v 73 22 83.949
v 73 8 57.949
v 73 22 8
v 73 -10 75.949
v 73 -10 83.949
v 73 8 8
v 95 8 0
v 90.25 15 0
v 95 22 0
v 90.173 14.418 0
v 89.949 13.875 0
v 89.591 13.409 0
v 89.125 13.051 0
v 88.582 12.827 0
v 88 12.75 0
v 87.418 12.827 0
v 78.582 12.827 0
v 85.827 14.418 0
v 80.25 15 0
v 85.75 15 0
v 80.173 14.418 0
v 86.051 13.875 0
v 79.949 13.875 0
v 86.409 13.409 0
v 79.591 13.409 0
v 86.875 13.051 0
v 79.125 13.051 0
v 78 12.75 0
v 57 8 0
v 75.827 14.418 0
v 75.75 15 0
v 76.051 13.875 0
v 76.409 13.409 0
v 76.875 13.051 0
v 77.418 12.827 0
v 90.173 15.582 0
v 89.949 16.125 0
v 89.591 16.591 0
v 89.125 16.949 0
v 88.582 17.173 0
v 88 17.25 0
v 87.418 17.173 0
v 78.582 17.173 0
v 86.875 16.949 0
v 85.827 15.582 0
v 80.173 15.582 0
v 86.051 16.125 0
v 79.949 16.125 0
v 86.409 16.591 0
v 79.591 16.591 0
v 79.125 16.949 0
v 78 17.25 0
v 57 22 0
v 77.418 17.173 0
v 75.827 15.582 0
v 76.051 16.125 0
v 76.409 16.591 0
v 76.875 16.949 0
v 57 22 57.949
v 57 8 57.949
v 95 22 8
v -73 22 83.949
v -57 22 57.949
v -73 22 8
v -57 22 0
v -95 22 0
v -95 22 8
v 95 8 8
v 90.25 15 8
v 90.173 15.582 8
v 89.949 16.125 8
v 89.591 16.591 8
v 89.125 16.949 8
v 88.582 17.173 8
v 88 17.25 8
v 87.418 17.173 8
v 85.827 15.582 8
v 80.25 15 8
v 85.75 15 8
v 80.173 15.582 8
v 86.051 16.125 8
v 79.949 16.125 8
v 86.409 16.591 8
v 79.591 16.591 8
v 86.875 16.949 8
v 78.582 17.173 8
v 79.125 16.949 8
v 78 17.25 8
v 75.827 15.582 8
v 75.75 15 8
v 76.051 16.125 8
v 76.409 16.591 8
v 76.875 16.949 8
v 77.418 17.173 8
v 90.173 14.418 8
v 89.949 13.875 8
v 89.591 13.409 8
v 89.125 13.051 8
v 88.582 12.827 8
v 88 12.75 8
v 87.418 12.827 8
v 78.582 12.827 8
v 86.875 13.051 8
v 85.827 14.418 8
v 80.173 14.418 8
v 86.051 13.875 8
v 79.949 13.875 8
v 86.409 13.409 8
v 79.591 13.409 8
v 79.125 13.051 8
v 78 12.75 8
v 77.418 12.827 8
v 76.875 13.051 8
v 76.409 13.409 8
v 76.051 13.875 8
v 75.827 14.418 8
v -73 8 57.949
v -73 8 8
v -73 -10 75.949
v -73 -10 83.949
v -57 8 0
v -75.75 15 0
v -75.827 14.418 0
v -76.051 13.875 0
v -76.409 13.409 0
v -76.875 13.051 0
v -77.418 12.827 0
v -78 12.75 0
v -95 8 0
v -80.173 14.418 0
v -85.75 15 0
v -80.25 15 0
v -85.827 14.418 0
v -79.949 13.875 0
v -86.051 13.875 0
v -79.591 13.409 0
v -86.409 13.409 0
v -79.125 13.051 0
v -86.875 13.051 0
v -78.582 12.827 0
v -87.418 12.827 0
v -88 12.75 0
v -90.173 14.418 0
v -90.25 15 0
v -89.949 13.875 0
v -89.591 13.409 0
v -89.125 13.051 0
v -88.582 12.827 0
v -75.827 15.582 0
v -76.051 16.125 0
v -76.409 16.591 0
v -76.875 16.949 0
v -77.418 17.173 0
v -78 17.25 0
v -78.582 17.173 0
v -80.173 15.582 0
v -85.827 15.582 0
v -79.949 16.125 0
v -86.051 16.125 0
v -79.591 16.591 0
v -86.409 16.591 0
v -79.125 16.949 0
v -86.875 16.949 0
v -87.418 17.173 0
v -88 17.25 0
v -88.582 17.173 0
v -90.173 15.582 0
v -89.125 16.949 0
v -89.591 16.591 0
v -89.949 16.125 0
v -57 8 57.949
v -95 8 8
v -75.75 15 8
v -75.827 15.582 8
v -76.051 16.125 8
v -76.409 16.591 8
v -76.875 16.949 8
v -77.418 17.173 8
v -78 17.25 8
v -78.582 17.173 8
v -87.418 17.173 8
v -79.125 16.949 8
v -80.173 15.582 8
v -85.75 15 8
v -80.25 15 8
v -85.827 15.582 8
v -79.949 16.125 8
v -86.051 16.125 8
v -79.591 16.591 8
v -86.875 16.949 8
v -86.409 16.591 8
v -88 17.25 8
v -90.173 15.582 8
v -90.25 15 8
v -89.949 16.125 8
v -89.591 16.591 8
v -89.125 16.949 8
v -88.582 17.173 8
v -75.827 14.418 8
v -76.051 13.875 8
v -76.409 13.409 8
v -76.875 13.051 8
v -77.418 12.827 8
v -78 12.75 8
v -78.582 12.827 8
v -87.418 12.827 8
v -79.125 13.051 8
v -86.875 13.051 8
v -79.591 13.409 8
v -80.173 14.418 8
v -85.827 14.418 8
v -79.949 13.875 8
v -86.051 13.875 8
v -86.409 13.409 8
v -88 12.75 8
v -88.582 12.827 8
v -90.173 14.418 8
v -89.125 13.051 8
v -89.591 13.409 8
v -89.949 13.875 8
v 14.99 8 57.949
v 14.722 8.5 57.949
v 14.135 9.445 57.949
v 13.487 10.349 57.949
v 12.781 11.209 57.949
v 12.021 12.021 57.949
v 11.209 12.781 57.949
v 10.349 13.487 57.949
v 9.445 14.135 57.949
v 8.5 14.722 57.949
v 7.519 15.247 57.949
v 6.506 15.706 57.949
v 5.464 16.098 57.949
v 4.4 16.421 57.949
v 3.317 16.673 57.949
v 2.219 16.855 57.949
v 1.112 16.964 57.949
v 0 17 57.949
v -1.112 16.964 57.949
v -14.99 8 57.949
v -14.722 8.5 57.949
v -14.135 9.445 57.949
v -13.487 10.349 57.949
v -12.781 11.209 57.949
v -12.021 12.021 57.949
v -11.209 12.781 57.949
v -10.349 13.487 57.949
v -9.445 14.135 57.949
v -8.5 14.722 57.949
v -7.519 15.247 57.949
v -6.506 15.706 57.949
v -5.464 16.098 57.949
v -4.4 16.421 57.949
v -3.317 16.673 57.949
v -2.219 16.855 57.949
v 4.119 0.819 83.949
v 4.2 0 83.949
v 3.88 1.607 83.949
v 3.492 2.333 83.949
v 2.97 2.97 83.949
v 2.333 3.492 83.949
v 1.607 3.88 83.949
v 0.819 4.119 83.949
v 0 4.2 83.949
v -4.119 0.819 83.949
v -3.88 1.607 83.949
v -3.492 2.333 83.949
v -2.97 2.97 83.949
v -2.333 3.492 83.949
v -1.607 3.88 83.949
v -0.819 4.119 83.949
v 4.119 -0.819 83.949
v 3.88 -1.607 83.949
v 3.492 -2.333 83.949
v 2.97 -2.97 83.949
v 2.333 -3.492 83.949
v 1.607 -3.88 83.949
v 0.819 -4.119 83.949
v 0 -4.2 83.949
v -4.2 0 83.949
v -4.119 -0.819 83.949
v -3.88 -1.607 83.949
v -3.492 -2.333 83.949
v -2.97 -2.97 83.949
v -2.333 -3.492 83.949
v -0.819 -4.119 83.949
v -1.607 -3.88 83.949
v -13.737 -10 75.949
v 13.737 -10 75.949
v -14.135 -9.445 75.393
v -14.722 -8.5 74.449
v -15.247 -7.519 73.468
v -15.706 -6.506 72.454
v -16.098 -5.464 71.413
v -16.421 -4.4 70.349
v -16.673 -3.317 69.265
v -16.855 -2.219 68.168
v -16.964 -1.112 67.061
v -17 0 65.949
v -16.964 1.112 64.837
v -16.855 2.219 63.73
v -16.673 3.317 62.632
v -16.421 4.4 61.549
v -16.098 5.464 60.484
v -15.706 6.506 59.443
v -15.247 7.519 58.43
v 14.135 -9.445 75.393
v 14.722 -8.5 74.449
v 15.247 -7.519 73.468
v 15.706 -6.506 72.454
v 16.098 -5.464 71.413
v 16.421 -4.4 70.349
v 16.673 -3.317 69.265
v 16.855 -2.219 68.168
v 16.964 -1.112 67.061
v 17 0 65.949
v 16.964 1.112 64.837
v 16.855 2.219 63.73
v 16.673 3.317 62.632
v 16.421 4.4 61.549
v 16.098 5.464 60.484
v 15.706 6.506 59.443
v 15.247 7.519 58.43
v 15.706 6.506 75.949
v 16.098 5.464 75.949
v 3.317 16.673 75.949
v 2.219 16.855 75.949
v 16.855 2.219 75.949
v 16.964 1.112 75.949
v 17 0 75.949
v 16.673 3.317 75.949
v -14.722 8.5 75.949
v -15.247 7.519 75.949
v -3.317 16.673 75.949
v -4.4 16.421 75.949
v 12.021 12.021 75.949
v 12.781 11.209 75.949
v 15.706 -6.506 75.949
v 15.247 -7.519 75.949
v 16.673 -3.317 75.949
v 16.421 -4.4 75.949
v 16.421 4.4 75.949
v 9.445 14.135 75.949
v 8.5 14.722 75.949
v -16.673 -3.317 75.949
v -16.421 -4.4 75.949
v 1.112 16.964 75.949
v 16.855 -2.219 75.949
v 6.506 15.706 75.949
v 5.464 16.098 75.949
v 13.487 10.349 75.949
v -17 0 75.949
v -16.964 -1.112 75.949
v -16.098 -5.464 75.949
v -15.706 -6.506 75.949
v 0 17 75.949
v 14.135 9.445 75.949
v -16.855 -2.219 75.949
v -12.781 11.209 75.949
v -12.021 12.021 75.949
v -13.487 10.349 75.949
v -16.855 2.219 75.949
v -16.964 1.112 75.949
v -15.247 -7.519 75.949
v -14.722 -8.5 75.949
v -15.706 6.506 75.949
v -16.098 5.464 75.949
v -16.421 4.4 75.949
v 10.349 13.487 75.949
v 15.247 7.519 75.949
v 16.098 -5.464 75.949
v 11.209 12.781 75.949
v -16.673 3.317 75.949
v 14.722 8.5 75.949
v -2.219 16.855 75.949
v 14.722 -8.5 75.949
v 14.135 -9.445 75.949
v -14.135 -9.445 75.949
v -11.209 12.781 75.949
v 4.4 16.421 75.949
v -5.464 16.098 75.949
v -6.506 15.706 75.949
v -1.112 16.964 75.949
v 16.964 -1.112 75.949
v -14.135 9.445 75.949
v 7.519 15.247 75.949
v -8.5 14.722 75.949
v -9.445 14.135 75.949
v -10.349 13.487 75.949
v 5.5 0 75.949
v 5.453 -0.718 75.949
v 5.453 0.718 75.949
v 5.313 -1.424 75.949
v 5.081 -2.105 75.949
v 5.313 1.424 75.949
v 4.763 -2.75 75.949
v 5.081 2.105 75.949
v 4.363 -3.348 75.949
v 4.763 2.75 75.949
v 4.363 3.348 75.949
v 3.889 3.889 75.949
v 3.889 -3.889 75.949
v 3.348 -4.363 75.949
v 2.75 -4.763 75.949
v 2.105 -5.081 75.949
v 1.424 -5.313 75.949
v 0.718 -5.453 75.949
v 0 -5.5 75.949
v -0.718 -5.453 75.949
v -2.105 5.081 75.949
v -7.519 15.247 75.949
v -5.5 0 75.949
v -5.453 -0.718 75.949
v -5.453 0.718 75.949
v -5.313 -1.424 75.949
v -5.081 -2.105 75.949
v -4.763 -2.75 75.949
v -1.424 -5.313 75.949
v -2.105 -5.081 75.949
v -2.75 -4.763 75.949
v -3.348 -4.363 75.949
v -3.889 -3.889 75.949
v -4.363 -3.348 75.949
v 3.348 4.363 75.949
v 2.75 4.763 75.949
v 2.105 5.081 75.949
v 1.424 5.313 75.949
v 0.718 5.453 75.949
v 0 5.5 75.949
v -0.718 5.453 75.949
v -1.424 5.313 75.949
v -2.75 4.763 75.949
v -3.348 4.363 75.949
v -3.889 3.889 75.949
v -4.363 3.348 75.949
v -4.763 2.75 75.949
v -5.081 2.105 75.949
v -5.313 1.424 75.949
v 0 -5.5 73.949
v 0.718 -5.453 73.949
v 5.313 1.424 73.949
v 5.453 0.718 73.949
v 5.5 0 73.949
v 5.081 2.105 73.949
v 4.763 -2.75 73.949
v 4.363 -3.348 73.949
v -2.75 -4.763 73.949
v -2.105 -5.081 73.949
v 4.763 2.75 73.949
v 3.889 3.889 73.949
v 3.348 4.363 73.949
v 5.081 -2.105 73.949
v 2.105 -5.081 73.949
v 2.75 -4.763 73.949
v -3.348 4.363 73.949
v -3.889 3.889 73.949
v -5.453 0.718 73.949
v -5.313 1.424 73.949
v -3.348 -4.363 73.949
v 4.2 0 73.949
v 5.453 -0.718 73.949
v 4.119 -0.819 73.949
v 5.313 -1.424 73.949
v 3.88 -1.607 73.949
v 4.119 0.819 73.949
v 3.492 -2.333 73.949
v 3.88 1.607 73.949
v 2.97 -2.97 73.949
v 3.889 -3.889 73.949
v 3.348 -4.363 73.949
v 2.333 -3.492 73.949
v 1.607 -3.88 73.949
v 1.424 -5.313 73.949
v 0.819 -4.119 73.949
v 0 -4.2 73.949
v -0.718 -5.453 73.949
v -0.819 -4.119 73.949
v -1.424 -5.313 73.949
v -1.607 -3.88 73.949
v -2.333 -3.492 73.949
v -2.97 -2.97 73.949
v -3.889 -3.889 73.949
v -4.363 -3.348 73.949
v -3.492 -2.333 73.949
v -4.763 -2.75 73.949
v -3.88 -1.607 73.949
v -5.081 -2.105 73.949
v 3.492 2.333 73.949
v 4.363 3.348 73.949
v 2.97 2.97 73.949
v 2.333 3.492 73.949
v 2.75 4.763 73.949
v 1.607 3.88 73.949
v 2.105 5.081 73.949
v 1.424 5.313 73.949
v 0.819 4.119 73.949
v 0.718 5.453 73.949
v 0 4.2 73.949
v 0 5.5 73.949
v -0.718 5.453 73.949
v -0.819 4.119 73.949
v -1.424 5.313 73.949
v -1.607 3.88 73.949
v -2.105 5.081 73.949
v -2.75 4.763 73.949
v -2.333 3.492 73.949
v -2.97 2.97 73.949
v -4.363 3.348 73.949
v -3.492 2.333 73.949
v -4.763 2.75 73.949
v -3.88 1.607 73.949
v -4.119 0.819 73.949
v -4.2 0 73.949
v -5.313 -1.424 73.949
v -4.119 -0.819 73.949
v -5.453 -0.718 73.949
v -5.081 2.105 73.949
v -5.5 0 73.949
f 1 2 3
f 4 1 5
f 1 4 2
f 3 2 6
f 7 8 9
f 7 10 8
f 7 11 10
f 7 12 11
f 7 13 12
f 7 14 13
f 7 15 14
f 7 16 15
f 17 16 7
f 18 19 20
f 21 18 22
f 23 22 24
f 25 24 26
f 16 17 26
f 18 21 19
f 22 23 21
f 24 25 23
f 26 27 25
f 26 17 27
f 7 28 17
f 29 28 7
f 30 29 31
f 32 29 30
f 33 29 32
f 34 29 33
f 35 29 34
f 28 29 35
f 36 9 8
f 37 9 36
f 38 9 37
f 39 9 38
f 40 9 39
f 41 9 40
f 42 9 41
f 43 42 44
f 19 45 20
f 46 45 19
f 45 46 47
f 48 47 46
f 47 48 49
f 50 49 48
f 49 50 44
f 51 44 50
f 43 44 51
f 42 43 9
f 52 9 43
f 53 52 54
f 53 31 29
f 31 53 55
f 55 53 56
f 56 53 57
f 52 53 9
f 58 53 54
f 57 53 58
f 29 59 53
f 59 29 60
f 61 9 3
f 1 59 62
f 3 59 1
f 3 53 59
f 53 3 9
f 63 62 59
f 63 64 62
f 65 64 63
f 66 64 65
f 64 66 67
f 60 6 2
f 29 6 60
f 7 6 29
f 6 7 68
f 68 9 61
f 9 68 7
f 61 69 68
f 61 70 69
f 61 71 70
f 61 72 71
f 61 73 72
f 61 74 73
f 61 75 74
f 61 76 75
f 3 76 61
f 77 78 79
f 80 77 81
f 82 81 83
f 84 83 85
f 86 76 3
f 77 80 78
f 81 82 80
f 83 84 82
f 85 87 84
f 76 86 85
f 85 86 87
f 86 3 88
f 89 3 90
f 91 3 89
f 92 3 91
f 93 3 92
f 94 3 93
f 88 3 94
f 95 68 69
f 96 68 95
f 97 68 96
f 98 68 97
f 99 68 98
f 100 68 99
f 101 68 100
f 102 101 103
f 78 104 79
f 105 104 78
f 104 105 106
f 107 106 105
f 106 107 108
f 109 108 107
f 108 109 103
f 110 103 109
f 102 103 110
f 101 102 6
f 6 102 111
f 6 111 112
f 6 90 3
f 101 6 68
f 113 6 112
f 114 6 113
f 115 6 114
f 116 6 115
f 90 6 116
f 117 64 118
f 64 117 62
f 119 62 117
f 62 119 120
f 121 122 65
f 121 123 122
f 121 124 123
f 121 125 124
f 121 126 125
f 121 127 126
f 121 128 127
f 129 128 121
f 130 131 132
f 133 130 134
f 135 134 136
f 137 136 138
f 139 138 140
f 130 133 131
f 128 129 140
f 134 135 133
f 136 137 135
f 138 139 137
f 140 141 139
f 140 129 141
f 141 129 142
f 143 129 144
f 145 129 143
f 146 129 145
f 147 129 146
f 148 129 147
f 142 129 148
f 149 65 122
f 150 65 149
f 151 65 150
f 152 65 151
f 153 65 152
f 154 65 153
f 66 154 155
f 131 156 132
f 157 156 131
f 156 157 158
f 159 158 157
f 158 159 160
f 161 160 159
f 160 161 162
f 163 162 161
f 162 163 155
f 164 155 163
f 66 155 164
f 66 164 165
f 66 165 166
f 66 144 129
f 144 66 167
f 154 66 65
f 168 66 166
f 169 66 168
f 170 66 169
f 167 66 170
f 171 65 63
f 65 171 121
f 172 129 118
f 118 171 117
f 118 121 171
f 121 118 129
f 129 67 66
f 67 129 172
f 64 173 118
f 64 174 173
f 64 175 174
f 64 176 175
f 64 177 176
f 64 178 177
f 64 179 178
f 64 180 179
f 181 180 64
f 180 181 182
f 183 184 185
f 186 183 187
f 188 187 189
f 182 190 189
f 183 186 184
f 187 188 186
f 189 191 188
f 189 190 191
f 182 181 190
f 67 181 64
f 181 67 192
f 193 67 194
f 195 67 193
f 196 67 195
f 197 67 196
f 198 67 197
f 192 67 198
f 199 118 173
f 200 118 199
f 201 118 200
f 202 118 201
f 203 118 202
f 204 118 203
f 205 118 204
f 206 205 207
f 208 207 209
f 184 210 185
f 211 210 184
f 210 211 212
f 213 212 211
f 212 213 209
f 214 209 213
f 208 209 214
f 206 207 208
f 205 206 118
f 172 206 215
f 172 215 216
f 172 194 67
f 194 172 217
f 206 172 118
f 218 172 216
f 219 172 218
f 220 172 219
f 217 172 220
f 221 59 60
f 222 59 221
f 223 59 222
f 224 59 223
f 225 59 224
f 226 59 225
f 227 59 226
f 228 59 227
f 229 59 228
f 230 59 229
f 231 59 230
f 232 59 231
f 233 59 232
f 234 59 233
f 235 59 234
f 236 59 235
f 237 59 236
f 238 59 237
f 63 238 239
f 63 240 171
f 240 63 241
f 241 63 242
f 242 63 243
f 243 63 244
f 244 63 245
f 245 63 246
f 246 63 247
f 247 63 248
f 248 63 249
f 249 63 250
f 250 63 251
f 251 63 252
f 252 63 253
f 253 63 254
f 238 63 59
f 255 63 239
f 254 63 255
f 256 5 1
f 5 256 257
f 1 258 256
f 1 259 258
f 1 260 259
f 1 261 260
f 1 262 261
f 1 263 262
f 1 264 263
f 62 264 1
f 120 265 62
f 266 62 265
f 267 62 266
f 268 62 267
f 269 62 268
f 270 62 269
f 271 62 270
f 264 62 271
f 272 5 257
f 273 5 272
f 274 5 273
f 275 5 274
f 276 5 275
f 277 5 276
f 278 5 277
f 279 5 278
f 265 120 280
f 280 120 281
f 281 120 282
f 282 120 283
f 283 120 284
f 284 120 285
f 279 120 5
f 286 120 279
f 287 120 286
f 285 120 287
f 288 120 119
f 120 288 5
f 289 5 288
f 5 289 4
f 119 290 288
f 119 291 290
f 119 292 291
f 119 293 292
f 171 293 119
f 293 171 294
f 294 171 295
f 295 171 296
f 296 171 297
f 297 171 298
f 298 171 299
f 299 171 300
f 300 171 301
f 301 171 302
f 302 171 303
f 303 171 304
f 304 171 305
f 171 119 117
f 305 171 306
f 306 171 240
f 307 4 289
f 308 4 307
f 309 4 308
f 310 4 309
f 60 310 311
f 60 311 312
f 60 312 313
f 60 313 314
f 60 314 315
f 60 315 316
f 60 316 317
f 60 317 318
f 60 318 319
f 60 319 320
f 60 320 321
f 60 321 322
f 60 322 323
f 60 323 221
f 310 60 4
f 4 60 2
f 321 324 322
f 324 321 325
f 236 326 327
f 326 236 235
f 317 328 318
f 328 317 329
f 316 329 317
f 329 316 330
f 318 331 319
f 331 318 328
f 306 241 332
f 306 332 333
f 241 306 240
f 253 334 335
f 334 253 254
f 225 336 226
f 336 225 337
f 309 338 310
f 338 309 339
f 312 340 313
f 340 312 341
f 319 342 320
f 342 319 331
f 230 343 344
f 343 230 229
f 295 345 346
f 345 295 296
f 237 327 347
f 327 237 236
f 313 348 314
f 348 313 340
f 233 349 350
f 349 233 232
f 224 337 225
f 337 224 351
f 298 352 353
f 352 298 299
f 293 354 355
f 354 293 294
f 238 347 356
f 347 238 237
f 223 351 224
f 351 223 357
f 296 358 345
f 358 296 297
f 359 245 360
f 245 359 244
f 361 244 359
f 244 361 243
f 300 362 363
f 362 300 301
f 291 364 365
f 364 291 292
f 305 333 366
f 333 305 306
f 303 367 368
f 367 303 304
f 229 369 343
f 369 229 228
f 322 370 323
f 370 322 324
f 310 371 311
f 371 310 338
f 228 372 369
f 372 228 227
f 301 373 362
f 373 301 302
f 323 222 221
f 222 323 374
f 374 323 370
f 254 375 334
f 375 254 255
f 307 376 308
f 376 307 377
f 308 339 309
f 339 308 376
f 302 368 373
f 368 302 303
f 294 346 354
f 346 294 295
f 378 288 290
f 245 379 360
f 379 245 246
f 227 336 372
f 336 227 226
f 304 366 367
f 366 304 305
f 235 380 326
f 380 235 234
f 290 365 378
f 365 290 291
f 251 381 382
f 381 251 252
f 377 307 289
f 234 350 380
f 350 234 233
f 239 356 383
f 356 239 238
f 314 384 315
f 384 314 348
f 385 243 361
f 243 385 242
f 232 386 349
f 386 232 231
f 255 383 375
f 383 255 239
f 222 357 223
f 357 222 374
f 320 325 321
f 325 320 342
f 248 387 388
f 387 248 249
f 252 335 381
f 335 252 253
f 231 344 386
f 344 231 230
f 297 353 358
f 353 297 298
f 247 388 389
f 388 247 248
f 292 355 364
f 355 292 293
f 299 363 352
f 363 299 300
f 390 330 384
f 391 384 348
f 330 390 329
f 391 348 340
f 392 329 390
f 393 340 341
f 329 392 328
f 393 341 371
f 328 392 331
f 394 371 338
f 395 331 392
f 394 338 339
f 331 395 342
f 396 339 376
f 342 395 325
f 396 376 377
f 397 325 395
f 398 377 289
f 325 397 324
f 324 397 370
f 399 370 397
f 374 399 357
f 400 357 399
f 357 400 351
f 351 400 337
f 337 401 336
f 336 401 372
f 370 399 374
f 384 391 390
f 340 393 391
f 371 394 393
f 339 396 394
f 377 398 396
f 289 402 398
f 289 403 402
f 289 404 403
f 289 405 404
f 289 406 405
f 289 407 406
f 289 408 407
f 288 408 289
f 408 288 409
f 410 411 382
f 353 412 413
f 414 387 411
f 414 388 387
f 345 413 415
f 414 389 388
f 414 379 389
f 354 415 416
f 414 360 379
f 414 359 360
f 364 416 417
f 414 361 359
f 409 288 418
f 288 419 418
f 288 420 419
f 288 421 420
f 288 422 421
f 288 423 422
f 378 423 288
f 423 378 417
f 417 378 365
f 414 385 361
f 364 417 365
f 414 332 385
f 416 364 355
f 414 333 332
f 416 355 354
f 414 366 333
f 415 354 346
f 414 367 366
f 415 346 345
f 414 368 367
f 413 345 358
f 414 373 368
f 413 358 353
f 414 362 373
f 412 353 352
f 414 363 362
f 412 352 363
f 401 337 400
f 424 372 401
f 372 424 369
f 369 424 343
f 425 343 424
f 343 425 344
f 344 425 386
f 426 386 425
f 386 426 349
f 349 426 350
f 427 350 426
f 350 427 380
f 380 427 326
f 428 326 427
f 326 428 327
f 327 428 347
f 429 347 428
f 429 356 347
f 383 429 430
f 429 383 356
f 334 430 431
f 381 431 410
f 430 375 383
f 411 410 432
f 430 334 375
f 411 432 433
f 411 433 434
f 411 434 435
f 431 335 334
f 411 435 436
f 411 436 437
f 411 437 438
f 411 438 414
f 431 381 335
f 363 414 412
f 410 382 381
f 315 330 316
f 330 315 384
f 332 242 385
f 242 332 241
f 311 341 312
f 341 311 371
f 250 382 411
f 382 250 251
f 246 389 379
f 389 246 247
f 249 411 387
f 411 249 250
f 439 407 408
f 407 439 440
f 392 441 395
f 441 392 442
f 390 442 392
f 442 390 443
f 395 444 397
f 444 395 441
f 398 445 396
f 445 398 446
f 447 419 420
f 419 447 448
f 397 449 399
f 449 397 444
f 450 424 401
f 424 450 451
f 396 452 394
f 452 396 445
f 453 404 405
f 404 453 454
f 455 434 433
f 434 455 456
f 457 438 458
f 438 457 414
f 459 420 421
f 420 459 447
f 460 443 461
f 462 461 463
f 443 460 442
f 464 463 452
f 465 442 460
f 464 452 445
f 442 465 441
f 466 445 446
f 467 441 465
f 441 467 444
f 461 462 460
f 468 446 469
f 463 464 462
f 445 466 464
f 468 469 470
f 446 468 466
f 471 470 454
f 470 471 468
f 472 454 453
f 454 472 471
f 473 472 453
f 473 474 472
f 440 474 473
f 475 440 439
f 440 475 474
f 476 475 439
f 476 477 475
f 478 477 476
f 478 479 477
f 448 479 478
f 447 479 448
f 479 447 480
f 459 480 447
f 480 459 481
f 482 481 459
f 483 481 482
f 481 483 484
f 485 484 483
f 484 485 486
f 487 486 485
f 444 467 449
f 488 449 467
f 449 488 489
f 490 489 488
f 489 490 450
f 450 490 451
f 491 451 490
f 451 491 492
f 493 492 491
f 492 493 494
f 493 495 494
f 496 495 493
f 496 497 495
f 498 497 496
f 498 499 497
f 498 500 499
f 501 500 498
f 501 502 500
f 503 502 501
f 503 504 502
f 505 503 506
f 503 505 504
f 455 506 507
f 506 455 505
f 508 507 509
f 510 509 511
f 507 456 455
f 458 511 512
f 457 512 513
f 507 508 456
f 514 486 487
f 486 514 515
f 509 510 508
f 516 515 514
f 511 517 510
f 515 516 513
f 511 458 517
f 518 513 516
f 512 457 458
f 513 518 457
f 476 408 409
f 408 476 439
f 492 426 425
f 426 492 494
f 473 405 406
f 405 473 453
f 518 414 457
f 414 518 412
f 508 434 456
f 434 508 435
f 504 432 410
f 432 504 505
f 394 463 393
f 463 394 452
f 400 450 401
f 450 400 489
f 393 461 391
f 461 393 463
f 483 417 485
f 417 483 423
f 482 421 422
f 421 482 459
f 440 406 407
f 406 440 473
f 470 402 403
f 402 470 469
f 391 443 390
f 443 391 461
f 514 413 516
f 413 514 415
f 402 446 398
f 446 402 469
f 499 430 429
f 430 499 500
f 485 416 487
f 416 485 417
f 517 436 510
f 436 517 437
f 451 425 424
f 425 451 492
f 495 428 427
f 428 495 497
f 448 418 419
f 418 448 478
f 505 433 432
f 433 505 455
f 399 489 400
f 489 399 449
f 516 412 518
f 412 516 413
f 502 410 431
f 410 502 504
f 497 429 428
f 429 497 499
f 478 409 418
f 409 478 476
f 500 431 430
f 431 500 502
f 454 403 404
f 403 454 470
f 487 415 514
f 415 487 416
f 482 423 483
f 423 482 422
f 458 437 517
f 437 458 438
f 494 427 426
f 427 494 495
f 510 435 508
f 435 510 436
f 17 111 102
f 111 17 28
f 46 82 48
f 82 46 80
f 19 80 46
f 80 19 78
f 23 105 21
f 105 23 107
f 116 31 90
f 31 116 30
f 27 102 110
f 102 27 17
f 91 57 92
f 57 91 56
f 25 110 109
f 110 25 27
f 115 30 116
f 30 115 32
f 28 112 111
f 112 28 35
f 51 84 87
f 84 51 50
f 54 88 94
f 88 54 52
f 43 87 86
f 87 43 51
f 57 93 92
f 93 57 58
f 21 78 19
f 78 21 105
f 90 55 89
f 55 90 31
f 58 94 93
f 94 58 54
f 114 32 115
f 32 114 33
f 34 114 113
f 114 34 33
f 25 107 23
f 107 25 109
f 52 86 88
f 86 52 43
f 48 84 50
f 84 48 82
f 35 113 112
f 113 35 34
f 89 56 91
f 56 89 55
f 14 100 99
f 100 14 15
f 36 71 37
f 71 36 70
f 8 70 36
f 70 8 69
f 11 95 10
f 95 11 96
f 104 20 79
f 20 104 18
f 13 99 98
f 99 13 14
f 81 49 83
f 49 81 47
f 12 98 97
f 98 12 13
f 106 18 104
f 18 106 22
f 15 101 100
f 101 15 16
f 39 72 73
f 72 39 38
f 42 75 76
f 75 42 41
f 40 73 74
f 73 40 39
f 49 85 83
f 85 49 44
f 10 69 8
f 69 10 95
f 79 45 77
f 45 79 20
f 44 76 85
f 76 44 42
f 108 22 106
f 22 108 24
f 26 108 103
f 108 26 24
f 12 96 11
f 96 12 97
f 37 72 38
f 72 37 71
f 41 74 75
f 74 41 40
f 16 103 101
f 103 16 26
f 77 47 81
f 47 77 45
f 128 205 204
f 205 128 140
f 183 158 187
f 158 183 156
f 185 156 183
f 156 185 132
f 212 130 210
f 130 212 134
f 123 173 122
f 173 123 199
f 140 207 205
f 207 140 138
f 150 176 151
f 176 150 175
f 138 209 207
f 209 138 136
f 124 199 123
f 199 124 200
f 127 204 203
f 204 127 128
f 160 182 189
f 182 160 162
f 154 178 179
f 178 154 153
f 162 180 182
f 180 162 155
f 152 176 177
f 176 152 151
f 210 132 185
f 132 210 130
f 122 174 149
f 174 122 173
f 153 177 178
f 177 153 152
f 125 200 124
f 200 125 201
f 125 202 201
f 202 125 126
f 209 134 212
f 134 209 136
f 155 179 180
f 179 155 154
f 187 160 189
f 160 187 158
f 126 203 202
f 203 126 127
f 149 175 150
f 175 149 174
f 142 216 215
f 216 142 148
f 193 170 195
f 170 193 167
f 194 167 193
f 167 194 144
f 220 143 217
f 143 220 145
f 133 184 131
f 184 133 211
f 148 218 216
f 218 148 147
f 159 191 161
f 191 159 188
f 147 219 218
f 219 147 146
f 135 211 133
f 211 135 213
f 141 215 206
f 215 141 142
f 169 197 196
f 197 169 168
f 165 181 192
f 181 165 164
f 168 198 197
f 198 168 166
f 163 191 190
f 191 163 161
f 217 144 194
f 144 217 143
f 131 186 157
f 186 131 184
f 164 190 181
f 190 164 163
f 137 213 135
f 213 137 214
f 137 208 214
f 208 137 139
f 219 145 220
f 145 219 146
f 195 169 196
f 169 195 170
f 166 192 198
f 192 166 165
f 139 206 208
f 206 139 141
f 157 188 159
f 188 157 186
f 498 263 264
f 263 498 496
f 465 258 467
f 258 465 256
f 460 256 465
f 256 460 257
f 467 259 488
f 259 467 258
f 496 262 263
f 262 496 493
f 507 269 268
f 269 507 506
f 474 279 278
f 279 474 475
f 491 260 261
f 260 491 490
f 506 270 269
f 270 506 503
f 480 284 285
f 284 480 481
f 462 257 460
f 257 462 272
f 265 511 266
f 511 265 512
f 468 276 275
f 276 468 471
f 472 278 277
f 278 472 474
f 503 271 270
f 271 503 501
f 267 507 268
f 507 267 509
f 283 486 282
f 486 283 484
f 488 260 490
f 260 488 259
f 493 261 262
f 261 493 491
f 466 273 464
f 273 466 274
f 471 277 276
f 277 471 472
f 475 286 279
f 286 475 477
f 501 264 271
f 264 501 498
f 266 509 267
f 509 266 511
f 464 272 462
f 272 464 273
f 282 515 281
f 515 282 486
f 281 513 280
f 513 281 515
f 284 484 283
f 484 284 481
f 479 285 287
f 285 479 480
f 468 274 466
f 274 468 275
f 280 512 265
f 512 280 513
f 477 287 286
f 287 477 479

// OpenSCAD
// file: ../lib/helpers.scad
// Personal helper routines (house style for all OpenSCAD in this repo).
// Conventions:
//   tx/ty/tz(q)  translate along one axis; q may be a list -> replicate
//   txy/tyz/txz  translate in a plane by [a,b] or list of pairs -> replicate
//   rx/ry/rz(q)  rotate about one axis; list -> replicate
//   mx/my/mz(q)  mirror about one axis; list like [0,1] -> original + mirrored
//   cub(d, c)    cube with per-axis centering: 0 from origin, 1 centered,
//                -1 extending negative
//   sq(d, c, r)  2D analog of cub, optional corner radius r
//   hull_seq()   hull each adjacent pair of children (chained hulls)
// Prefer these over raw translate/rotate/mirror throughout.

module hull_seq()
  for (i=[0:$children-2]) hull() { children(i); children(i+1); }

module cub(d, c=[0, 0, 0])
  tx(c[0] == -1 ? -d[0] : c[0] ? -d[0]/2 : 0)
  ty(c[1] == -1 ? -d[1] : c[1] ? -d[1]/2 : 0)
  tz(c[2] == -1 ? -d[2] : c[2] ? -d[2]/2 : 0)
  cube(d);

module sq(d, c=[0, 0], r=0)
  tx(c[0] == -1 ? -d[0] : c[0] ? -d[0]/2 : 0)
  ty(c[1] == -1 ? -d[1] : c[1] ? -d[1]/2 : 0)
  if (r <= 0) { square(d); }
  else { hull() ty([r, d[1]-r]) tx([r, d[0]-r]) circle(r=r); }

module txy(q)
  if (is_list(q) && is_list(q[0])) for (qq=q) txy(qq) children();
  else translate([q[0], q[1], 0]) children();

module tyz(q)
  if (is_list(q) && is_list(q[0])) for (qq=q) tyz(qq) children();
  else translate([0, q[0], q[1]]) children();

module txz(q)
  if (is_list(q) && is_list(q[0])) for (qq=q) txz(qq) children();
  else translate([q[0], 0, q[1]]) children();

module tq(q, v)
  if (is_list(q)) for (qq=q) tq(qq, v) children();
  else translate(q*v) children();

module tx(q) tq(q, [1, 0, 0]) children();
module ty(q) tq(q, [0, 1, 0]) children();
module tz(q) tq(q, [0, 0, 1]) children();

module mq(q, v)
  if (is_list(q)) for (qq=q) mq(qq, v) children();
  else mirror(q*v) children();

module mx(q=1) mq(q, [1, 0, 0]) children();
module my(q=1) mq(q, [0, 1, 0]) children();
module mz(q=1) mq(q, [0, 0, 1]) children();

// generic rotation recursively expands q and rotates about v
module rq(q, v)
  if (is_list(q)) for (qq=q) rq(qq, v) children();
  else rotate(q*v) children();

// specific rotation about x, y, z for everyday convenience
module rx(q) rq(q, [1, 0, 0]) children();
module ry(q) rq(q, [0, 1, 0]) children();
module rz(q) rq(q, [0, 0, 1]) children();
// main file
// Drum bridge: spans the gear+drum tangent to the sector arc and picks up
// the top of the M8 dead axle, turning it from cantilevered into simply
// supported. The axle is dead, so no bearing lives here — the nyloc on
// top clamps board, standoff, bearings (via the inner-race spacers), and
// bridge into one preloaded column.
//
// Local coords: drum axis at the origin, +X along the tangent, +Y
// outboard (away from the sector), z = 0 at the board face. Legs sit
// bridge_offset outboard so the cable runs (~7 mm inboard of the tangent
// line, up to ~z 69) pass clear; the beam's underside flares to full
// depth at 45 deg well above them. Print lying on its outboard back —
// the flare makes it support-free.
//
// Radial cable load bends the beam about its strong axis: ~0.05 mm at
// full torque.

include <params.scad>
use <../lib/helpers.scad>

leg_h = gear_z + drum_z_top + 2 - board_face_z;  // underside: race + 2 mm pilot
bw = 2 * bridge_half_span + bridge_leg[0];       // beam length
y1 = bridge_offset + bridge_leg[1] / 2;          // outboard face

module bridge() {
  difference() {
    union() {
      difference() {
        union() {
          mx([0, 1]) tx(bridge_half_span) {
            // leg + foot pad
            ty(bridge_offset) cub([bridge_leg[0], bridge_leg[1], leg_h + 1], [1, 1, 0]);
            ty(bridge_offset) cub([30, bridge_leg[1], 8], [0, 1, 0]);
          }
          // beam: full-depth plate on top, flaring at 45 deg down to leg depth
          hull() {
            tz(leg_h) txy([-bw / 2, y1 - bridge_beam_d])
              cub([bw, bridge_beam_d, bridge_beam_t]);
            tz(leg_h - (bridge_beam_d - bridge_leg[1]))
              txy([-bw / 2, y1 - bridge_leg[1]])
                cub([bw, bridge_leg[1],
                     bridge_beam_t + bridge_beam_d - bridge_leg[1]]);
          }
        }
        // clearance pocket: the flare would otherwise descend into the
        // spinning top boss (r15 to z+29) and upper flange; hollow the
        // underside to r17 so only the top slab spans the drum
        tz(leg_h - 20.5) cylinder(d = 34, h = 20.5, $fn = 96);
      }
      // race pilot: bears only on the top 608's inner race, so the nyloc
      // puts slight axial preload through races and inner spacers while
      // the gear+drum spins clear of the pocket
      tz(leg_h - 2) cylinder(d = race_tip_d, h = 2.1, $fn = 48);
    }
    // axle hole through the beam and pilot
    tz(leg_h - 20) cylinder(d = axle_hole_d, h = bridge_beam_t + 21, $fn = 32);
    // foot bolts
    mx([0, 1]) tx([for (b = bridge_foot_bolts) bridge_half_span + b])
      ty(bridge_offset) tz(-0.5) cylinder(d = 4.5, h = 9, $fn = 24);
  }
}

bridge();
